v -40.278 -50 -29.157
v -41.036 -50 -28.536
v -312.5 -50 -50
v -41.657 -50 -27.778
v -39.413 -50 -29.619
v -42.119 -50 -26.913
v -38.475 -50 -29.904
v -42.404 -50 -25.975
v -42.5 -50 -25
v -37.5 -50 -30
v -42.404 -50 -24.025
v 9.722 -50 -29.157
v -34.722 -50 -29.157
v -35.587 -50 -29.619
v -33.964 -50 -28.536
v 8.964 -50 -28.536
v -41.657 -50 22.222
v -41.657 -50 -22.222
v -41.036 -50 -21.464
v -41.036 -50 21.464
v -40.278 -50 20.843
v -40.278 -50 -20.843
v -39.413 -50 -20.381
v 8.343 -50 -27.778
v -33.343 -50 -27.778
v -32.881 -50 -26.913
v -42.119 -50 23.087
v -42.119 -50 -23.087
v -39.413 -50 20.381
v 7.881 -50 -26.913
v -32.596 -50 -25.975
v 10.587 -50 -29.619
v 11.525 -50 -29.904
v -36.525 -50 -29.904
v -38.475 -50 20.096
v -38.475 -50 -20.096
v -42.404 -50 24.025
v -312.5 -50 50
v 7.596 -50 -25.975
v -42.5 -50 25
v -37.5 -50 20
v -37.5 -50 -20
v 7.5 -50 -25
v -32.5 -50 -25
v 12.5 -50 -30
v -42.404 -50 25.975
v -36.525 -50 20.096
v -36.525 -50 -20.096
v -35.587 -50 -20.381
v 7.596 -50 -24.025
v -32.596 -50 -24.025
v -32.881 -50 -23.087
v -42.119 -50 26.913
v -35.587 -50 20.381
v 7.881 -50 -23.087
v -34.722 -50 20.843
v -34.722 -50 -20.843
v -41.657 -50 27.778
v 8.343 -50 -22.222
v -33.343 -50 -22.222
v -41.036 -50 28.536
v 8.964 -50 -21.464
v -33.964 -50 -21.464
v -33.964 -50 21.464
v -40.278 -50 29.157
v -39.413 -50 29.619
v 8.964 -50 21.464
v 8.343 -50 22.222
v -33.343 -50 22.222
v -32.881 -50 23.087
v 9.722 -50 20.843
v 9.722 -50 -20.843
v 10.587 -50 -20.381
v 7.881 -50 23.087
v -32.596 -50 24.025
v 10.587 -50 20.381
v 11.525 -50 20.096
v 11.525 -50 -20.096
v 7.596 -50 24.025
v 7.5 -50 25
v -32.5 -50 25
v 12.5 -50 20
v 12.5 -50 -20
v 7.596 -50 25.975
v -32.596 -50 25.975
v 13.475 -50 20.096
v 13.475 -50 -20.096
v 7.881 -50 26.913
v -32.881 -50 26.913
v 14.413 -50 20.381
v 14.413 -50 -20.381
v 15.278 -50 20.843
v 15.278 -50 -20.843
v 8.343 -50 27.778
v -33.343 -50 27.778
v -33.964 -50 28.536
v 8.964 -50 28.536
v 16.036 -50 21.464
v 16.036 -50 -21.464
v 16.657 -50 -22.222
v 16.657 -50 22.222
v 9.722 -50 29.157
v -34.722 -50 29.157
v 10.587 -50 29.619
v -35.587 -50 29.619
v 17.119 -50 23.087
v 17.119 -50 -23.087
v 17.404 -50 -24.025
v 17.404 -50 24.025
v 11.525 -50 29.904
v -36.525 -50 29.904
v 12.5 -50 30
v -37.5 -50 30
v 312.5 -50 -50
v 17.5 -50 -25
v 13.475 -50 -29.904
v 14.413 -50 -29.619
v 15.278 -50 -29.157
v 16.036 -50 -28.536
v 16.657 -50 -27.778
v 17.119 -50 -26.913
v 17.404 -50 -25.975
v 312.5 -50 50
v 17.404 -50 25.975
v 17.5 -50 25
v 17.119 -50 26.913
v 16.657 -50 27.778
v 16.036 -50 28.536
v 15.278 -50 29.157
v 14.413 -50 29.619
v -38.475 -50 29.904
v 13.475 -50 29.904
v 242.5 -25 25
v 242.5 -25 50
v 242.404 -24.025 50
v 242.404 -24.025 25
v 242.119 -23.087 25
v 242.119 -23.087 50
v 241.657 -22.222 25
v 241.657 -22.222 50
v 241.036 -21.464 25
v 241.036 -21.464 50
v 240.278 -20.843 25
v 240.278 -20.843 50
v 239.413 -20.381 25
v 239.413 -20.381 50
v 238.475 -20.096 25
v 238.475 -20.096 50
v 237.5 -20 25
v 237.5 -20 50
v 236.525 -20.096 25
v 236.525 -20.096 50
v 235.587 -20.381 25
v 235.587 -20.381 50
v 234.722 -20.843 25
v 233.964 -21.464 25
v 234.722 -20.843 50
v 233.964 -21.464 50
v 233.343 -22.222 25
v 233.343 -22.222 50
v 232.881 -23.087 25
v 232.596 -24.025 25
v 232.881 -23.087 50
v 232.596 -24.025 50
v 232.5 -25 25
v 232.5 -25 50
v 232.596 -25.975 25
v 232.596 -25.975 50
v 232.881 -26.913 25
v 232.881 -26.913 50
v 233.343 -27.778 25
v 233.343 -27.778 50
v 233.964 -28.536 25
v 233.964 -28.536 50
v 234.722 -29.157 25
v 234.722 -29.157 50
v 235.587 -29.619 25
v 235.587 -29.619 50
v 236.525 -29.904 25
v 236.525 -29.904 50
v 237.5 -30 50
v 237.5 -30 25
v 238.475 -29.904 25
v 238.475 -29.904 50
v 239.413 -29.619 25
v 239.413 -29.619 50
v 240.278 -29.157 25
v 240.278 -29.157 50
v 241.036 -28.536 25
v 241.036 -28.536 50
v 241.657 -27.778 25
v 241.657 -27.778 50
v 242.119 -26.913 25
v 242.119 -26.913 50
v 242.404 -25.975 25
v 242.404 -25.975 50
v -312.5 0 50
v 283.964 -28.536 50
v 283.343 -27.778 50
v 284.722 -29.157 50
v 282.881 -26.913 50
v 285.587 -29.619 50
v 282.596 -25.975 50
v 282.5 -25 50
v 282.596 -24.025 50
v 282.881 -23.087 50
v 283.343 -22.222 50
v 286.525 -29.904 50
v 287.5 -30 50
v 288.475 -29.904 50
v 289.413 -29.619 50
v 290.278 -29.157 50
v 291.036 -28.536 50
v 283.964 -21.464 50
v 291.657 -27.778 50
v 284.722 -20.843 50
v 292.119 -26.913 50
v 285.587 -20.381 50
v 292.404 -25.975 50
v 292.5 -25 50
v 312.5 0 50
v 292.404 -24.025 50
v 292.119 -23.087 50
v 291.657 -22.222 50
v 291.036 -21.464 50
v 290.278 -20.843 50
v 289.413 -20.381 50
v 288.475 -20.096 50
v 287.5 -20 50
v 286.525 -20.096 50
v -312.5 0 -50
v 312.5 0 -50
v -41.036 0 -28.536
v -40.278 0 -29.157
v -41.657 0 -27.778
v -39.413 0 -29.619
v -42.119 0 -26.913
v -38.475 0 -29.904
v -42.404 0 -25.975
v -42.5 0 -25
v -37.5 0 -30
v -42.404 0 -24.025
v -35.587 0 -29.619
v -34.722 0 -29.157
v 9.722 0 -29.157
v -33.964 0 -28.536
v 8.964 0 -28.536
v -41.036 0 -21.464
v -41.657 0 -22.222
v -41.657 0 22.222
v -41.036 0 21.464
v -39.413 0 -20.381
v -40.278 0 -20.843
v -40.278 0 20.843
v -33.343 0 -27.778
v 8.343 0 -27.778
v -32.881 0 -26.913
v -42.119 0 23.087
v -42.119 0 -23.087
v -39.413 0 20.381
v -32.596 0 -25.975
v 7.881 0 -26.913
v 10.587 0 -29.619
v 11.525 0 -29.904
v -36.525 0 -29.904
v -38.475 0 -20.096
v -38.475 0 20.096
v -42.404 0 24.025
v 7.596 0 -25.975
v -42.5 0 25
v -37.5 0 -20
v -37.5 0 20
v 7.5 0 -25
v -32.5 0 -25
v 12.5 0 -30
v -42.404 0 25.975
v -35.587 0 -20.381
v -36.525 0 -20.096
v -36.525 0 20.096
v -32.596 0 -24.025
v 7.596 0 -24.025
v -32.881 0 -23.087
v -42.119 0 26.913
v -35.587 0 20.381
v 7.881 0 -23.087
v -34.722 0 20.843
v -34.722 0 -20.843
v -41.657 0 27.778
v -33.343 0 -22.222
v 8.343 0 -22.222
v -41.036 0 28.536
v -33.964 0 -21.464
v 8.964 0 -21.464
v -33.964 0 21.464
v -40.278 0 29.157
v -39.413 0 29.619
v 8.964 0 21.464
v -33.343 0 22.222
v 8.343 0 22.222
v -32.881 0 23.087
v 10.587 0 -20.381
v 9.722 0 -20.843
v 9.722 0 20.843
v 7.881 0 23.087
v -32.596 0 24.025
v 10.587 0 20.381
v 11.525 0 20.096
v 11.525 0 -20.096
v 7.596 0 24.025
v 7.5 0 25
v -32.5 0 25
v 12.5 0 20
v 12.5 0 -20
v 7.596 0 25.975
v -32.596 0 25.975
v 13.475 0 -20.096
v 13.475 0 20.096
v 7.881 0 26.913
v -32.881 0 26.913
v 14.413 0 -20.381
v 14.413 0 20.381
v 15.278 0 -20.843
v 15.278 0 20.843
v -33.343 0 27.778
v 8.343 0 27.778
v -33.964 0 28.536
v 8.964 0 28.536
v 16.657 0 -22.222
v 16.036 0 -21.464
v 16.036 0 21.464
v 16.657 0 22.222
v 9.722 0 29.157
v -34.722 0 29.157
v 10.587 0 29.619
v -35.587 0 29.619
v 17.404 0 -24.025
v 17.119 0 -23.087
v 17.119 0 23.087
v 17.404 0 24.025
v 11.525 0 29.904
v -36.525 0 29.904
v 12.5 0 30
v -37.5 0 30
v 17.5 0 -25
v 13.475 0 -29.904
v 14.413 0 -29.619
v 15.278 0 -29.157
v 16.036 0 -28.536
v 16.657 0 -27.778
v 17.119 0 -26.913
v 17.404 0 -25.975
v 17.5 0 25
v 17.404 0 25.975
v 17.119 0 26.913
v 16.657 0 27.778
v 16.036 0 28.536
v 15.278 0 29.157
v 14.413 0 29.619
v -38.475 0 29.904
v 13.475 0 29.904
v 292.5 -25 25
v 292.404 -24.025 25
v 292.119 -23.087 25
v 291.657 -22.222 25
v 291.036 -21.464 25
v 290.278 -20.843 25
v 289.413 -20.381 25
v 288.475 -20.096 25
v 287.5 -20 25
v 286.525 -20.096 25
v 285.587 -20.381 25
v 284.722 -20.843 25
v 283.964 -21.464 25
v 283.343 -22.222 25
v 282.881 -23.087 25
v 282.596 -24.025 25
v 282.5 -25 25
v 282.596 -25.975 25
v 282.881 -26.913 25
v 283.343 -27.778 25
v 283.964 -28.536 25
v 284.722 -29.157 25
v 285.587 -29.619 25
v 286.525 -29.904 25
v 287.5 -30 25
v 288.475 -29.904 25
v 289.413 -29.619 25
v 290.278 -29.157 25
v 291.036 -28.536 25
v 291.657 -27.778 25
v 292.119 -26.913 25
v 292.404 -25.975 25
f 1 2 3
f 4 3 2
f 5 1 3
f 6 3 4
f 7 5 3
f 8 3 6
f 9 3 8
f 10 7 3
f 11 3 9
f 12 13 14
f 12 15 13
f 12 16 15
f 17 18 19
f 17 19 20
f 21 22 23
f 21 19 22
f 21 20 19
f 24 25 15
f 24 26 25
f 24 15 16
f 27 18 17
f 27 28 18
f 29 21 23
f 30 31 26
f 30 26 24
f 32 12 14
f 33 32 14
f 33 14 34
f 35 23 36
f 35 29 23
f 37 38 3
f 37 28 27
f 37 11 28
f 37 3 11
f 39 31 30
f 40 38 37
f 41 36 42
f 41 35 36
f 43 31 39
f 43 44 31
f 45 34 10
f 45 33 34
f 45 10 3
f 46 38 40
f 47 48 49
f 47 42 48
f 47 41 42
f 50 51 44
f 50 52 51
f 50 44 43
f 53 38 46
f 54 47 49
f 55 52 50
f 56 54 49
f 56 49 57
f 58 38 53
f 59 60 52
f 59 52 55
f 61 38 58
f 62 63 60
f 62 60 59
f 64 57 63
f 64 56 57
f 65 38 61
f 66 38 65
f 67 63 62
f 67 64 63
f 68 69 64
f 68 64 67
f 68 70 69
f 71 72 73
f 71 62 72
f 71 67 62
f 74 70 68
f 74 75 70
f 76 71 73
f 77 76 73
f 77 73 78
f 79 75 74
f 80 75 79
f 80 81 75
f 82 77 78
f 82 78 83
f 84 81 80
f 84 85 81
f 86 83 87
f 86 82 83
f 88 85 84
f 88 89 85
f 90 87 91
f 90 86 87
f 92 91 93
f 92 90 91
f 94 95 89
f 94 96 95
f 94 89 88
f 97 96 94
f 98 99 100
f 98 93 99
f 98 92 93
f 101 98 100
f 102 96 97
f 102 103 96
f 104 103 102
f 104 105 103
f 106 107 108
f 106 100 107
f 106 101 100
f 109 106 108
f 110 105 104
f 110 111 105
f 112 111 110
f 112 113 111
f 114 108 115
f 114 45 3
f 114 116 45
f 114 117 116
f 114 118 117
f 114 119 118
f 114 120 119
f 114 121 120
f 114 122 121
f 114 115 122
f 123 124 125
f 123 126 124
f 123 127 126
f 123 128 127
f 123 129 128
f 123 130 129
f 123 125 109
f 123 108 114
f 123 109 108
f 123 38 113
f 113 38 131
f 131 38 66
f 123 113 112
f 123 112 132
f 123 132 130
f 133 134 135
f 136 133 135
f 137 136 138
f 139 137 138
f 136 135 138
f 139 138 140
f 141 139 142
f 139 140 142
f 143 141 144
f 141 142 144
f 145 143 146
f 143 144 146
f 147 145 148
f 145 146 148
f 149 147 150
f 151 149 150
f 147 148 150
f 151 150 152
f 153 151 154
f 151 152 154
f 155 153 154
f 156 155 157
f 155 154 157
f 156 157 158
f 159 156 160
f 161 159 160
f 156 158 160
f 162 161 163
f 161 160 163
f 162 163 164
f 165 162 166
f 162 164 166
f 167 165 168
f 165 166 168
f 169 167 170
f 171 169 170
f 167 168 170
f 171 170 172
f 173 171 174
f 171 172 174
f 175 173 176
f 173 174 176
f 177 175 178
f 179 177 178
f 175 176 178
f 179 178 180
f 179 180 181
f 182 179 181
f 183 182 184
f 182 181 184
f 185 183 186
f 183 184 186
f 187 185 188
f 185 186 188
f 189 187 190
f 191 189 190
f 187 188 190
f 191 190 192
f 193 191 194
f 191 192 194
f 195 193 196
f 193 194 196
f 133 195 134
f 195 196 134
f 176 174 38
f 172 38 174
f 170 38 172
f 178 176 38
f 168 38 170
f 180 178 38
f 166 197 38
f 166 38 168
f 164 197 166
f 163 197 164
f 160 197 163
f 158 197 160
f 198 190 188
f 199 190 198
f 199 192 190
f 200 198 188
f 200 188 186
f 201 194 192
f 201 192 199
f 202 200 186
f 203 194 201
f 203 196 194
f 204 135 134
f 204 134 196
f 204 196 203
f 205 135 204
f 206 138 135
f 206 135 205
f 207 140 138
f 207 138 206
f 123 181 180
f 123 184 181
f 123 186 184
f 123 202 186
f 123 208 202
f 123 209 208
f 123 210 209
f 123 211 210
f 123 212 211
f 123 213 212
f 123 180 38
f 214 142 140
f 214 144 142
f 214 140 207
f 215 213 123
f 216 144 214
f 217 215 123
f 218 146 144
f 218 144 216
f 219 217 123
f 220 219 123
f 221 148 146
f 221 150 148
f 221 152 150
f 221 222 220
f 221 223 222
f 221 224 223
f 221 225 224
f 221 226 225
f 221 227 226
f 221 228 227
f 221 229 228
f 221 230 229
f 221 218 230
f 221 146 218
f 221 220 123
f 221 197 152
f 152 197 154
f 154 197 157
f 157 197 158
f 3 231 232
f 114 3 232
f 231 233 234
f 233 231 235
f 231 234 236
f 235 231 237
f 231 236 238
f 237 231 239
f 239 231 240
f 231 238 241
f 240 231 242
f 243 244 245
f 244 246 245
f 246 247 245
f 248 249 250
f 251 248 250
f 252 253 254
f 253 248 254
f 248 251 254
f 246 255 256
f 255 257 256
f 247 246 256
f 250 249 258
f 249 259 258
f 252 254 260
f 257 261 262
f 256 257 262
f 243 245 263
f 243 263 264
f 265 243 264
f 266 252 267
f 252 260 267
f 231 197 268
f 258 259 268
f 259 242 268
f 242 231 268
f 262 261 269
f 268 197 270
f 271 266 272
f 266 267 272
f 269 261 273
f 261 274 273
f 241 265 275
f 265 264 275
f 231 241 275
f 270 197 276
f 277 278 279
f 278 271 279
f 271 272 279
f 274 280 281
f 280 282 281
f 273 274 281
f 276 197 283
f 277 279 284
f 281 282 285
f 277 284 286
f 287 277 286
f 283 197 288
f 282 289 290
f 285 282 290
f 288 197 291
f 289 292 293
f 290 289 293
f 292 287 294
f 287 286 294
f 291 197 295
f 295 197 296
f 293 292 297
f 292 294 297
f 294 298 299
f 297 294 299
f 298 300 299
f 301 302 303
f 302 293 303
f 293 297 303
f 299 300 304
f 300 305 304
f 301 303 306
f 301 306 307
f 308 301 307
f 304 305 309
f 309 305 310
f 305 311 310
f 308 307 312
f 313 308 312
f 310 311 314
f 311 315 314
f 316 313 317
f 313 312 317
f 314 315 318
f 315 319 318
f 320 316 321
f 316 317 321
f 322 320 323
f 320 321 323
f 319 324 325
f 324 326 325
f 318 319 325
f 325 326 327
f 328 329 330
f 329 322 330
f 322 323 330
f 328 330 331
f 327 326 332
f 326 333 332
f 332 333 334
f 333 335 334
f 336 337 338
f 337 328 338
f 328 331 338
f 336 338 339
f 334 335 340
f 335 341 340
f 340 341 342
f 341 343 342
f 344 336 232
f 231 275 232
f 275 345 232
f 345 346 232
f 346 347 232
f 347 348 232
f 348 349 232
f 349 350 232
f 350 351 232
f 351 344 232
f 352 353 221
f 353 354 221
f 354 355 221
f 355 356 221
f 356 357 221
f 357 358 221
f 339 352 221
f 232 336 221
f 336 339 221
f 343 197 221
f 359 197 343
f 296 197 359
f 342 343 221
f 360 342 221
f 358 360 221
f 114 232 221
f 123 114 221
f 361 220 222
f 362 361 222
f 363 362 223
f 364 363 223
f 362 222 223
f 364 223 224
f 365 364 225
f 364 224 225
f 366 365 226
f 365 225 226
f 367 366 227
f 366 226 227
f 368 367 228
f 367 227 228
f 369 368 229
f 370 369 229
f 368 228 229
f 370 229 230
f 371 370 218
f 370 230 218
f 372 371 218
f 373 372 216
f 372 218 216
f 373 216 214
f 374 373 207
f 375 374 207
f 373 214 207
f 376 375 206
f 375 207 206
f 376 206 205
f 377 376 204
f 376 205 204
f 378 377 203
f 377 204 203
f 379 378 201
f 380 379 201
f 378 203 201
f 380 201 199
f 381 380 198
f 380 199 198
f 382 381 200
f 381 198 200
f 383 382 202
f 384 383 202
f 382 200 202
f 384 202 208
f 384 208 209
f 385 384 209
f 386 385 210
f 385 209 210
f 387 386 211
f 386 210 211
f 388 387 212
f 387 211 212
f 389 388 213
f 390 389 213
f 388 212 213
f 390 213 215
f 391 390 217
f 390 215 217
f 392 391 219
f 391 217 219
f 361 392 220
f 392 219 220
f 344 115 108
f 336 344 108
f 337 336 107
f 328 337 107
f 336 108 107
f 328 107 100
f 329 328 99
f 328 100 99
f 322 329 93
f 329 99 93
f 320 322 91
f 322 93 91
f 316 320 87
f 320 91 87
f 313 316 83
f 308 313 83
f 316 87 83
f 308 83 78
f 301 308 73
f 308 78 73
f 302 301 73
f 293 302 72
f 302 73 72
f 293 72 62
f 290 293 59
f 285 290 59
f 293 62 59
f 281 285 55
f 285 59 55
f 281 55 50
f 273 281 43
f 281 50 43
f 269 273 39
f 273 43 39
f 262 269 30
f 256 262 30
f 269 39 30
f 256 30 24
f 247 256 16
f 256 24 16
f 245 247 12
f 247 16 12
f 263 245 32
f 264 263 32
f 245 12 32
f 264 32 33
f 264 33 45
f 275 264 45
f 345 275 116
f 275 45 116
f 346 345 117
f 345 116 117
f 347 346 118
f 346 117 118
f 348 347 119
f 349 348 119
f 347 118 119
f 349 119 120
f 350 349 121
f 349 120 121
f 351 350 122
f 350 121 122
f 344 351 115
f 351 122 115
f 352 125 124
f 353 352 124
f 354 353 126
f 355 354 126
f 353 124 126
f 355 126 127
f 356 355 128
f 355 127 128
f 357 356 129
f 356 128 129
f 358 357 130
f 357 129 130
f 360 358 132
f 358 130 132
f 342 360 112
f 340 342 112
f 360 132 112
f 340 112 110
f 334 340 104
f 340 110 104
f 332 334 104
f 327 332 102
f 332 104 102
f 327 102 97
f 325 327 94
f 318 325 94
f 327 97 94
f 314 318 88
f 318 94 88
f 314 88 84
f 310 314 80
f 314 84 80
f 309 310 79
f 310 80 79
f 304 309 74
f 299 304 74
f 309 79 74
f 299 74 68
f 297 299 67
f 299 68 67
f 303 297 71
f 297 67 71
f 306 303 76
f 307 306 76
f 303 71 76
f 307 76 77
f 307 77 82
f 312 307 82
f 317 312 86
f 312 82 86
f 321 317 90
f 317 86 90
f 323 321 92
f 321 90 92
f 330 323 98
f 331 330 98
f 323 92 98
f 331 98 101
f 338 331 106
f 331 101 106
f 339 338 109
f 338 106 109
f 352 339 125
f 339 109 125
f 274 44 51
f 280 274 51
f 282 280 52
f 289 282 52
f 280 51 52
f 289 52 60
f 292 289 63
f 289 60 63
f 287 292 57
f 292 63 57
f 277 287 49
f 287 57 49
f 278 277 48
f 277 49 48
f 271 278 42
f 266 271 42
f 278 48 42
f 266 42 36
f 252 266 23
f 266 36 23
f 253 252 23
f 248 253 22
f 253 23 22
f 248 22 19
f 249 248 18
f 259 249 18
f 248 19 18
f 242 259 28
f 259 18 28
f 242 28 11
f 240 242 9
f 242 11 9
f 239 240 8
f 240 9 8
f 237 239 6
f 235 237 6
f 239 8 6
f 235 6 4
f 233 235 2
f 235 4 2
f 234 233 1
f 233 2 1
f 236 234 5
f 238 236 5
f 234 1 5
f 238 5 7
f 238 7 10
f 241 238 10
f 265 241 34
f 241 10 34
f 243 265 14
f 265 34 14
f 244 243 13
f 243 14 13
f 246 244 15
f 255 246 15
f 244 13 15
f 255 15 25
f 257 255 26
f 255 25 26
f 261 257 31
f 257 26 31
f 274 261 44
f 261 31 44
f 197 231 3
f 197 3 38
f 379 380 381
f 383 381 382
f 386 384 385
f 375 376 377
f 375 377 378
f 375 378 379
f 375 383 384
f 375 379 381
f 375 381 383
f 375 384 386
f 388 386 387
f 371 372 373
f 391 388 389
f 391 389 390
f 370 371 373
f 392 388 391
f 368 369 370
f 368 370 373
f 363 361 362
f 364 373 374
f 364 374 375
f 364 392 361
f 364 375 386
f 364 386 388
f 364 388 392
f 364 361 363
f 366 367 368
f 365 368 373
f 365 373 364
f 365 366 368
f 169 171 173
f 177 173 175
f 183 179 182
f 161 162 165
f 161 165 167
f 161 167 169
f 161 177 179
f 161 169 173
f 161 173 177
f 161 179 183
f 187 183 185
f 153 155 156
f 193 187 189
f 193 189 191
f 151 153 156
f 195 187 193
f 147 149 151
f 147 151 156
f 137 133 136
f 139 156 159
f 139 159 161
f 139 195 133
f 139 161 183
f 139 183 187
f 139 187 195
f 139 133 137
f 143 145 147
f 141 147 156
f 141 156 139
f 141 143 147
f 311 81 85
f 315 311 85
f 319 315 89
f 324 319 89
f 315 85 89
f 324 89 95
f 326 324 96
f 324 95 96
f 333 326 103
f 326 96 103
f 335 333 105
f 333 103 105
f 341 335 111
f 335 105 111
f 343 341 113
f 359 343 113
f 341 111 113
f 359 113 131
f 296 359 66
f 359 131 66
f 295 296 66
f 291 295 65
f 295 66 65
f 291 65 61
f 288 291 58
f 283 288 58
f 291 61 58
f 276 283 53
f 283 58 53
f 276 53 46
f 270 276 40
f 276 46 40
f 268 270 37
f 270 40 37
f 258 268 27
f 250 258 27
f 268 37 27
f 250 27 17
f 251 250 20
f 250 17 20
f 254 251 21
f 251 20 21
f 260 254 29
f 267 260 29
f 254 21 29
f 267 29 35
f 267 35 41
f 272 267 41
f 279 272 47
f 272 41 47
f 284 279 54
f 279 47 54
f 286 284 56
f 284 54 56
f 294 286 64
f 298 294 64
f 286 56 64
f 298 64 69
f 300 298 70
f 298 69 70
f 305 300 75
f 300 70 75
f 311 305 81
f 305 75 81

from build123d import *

# Parameters (mm, degrees)
F0_W     = 625
F0_H     = 100
F1_DEPTH = 50
F2_R     = 5
F3_DEPTH = 50
F4_R     = 5
F5_DEPTH = 25


with BuildPart() as f1:
    # F0 (on Front) → F1 (new body)
    with BuildSketch(Plane.XZ):
        Rectangle(F0_W, F0_H)
    extrude(amount=F1_DEPTH)

    # F2 (on face) → F3 (cut)
    with BuildSketch(Plane.XZ.offset(50)):
        with Locations((-37.5, -25)):
            Circle(F2_R)
        with Locations((12.5, -25)):
            Circle(F2_R)
        with Locations((-37.5, 25)):
            Circle(F2_R)
        with Locations((12.5, 25)):
            Circle(F2_R)
    extrude(amount=-F3_DEPTH, mode=Mode.SUBTRACT)

    # F4 (on face) → F5 (cut)
    with BuildSketch(Plane.XY.offset(50)):
        with Locations((237.5, -25)):
            Circle(F4_R)
        with Locations((287.5, -25)):
            Circle(F4_R)
    extrude(amount=-F5_DEPTH, mode=Mode.SUBTRACT)


solid = f1.part
